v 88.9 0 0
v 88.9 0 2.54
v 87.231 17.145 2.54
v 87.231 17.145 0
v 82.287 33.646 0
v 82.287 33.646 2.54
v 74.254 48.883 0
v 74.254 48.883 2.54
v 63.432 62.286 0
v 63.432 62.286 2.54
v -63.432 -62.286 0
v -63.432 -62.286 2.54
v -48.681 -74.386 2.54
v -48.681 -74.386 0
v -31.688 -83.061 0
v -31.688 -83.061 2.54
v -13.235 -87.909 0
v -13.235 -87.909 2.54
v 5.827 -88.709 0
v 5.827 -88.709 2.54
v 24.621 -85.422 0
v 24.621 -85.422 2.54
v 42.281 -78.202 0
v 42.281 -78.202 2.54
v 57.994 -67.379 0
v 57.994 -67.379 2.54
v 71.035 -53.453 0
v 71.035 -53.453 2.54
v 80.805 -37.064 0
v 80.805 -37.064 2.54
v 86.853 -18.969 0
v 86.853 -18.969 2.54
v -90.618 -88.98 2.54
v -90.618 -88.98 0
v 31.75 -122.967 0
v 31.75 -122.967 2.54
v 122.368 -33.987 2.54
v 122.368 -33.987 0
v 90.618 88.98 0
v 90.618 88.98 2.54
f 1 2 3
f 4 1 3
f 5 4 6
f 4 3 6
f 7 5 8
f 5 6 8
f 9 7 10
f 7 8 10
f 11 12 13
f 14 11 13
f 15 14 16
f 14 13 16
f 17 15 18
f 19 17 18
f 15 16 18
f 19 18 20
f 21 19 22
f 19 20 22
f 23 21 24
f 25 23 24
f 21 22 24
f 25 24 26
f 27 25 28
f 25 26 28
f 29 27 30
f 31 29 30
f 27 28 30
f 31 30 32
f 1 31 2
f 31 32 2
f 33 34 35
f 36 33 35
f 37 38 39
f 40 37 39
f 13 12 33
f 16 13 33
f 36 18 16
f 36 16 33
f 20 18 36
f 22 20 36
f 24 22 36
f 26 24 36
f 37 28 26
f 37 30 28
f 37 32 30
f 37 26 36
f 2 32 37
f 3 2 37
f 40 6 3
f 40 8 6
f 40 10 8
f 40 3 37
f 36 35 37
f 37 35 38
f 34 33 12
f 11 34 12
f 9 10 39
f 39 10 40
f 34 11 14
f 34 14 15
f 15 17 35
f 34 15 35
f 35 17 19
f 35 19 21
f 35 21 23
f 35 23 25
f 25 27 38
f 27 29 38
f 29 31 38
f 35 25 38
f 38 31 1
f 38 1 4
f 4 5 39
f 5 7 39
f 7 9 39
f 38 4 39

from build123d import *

# Parameters (mm, degrees)
F1_DEPTH = 2.54
F3_DEPTH = 25.4
F5_DEPTH = 25.4


with BuildPart() as f1:
    # F0 (on Top) → F1 (new body)
    with BuildSketch(Plane.XY):
        Polygon((31.749999, -122.967221), (122.367737, -33.987305), (90.617738, 88.979917), (-31.749999, 122.967221), (-122.367737, 33.987305), (-90.617738, -88.979917), align=None)
    extrude(amount=F1_DEPTH)

    # F2 (on face) → F3 (cut)
    with BuildSketch(Plane.XY.offset(2.54)):
        Polygon((-90.617738, -88.979917), (90.617738, 88.979917), (-31.749999, 122.967221), (-122.367737, 33.987305), align=None)
    extrude(amount=-F3_DEPTH, mode=Mode.SUBTRACT)

    # F4 (on face) → F5 (cut)
    with BuildSketch(Plane.XY.offset(2.54)):
        with BuildLine():
            ThreePointArc((-63.432417, -62.285942), (33.645714, -82.287155), (88.9, 0))
            ThreePointArc((88.9, 0), (82.287155, 33.645714), (63.432417, 62.285942))
            Line((63.432417, 62.285942), (-63.432417, -62.285942))
        make_face()
    extrude(amount=-F5_DEPTH, mode=Mode.SUBTRACT)


solid = f1.part
